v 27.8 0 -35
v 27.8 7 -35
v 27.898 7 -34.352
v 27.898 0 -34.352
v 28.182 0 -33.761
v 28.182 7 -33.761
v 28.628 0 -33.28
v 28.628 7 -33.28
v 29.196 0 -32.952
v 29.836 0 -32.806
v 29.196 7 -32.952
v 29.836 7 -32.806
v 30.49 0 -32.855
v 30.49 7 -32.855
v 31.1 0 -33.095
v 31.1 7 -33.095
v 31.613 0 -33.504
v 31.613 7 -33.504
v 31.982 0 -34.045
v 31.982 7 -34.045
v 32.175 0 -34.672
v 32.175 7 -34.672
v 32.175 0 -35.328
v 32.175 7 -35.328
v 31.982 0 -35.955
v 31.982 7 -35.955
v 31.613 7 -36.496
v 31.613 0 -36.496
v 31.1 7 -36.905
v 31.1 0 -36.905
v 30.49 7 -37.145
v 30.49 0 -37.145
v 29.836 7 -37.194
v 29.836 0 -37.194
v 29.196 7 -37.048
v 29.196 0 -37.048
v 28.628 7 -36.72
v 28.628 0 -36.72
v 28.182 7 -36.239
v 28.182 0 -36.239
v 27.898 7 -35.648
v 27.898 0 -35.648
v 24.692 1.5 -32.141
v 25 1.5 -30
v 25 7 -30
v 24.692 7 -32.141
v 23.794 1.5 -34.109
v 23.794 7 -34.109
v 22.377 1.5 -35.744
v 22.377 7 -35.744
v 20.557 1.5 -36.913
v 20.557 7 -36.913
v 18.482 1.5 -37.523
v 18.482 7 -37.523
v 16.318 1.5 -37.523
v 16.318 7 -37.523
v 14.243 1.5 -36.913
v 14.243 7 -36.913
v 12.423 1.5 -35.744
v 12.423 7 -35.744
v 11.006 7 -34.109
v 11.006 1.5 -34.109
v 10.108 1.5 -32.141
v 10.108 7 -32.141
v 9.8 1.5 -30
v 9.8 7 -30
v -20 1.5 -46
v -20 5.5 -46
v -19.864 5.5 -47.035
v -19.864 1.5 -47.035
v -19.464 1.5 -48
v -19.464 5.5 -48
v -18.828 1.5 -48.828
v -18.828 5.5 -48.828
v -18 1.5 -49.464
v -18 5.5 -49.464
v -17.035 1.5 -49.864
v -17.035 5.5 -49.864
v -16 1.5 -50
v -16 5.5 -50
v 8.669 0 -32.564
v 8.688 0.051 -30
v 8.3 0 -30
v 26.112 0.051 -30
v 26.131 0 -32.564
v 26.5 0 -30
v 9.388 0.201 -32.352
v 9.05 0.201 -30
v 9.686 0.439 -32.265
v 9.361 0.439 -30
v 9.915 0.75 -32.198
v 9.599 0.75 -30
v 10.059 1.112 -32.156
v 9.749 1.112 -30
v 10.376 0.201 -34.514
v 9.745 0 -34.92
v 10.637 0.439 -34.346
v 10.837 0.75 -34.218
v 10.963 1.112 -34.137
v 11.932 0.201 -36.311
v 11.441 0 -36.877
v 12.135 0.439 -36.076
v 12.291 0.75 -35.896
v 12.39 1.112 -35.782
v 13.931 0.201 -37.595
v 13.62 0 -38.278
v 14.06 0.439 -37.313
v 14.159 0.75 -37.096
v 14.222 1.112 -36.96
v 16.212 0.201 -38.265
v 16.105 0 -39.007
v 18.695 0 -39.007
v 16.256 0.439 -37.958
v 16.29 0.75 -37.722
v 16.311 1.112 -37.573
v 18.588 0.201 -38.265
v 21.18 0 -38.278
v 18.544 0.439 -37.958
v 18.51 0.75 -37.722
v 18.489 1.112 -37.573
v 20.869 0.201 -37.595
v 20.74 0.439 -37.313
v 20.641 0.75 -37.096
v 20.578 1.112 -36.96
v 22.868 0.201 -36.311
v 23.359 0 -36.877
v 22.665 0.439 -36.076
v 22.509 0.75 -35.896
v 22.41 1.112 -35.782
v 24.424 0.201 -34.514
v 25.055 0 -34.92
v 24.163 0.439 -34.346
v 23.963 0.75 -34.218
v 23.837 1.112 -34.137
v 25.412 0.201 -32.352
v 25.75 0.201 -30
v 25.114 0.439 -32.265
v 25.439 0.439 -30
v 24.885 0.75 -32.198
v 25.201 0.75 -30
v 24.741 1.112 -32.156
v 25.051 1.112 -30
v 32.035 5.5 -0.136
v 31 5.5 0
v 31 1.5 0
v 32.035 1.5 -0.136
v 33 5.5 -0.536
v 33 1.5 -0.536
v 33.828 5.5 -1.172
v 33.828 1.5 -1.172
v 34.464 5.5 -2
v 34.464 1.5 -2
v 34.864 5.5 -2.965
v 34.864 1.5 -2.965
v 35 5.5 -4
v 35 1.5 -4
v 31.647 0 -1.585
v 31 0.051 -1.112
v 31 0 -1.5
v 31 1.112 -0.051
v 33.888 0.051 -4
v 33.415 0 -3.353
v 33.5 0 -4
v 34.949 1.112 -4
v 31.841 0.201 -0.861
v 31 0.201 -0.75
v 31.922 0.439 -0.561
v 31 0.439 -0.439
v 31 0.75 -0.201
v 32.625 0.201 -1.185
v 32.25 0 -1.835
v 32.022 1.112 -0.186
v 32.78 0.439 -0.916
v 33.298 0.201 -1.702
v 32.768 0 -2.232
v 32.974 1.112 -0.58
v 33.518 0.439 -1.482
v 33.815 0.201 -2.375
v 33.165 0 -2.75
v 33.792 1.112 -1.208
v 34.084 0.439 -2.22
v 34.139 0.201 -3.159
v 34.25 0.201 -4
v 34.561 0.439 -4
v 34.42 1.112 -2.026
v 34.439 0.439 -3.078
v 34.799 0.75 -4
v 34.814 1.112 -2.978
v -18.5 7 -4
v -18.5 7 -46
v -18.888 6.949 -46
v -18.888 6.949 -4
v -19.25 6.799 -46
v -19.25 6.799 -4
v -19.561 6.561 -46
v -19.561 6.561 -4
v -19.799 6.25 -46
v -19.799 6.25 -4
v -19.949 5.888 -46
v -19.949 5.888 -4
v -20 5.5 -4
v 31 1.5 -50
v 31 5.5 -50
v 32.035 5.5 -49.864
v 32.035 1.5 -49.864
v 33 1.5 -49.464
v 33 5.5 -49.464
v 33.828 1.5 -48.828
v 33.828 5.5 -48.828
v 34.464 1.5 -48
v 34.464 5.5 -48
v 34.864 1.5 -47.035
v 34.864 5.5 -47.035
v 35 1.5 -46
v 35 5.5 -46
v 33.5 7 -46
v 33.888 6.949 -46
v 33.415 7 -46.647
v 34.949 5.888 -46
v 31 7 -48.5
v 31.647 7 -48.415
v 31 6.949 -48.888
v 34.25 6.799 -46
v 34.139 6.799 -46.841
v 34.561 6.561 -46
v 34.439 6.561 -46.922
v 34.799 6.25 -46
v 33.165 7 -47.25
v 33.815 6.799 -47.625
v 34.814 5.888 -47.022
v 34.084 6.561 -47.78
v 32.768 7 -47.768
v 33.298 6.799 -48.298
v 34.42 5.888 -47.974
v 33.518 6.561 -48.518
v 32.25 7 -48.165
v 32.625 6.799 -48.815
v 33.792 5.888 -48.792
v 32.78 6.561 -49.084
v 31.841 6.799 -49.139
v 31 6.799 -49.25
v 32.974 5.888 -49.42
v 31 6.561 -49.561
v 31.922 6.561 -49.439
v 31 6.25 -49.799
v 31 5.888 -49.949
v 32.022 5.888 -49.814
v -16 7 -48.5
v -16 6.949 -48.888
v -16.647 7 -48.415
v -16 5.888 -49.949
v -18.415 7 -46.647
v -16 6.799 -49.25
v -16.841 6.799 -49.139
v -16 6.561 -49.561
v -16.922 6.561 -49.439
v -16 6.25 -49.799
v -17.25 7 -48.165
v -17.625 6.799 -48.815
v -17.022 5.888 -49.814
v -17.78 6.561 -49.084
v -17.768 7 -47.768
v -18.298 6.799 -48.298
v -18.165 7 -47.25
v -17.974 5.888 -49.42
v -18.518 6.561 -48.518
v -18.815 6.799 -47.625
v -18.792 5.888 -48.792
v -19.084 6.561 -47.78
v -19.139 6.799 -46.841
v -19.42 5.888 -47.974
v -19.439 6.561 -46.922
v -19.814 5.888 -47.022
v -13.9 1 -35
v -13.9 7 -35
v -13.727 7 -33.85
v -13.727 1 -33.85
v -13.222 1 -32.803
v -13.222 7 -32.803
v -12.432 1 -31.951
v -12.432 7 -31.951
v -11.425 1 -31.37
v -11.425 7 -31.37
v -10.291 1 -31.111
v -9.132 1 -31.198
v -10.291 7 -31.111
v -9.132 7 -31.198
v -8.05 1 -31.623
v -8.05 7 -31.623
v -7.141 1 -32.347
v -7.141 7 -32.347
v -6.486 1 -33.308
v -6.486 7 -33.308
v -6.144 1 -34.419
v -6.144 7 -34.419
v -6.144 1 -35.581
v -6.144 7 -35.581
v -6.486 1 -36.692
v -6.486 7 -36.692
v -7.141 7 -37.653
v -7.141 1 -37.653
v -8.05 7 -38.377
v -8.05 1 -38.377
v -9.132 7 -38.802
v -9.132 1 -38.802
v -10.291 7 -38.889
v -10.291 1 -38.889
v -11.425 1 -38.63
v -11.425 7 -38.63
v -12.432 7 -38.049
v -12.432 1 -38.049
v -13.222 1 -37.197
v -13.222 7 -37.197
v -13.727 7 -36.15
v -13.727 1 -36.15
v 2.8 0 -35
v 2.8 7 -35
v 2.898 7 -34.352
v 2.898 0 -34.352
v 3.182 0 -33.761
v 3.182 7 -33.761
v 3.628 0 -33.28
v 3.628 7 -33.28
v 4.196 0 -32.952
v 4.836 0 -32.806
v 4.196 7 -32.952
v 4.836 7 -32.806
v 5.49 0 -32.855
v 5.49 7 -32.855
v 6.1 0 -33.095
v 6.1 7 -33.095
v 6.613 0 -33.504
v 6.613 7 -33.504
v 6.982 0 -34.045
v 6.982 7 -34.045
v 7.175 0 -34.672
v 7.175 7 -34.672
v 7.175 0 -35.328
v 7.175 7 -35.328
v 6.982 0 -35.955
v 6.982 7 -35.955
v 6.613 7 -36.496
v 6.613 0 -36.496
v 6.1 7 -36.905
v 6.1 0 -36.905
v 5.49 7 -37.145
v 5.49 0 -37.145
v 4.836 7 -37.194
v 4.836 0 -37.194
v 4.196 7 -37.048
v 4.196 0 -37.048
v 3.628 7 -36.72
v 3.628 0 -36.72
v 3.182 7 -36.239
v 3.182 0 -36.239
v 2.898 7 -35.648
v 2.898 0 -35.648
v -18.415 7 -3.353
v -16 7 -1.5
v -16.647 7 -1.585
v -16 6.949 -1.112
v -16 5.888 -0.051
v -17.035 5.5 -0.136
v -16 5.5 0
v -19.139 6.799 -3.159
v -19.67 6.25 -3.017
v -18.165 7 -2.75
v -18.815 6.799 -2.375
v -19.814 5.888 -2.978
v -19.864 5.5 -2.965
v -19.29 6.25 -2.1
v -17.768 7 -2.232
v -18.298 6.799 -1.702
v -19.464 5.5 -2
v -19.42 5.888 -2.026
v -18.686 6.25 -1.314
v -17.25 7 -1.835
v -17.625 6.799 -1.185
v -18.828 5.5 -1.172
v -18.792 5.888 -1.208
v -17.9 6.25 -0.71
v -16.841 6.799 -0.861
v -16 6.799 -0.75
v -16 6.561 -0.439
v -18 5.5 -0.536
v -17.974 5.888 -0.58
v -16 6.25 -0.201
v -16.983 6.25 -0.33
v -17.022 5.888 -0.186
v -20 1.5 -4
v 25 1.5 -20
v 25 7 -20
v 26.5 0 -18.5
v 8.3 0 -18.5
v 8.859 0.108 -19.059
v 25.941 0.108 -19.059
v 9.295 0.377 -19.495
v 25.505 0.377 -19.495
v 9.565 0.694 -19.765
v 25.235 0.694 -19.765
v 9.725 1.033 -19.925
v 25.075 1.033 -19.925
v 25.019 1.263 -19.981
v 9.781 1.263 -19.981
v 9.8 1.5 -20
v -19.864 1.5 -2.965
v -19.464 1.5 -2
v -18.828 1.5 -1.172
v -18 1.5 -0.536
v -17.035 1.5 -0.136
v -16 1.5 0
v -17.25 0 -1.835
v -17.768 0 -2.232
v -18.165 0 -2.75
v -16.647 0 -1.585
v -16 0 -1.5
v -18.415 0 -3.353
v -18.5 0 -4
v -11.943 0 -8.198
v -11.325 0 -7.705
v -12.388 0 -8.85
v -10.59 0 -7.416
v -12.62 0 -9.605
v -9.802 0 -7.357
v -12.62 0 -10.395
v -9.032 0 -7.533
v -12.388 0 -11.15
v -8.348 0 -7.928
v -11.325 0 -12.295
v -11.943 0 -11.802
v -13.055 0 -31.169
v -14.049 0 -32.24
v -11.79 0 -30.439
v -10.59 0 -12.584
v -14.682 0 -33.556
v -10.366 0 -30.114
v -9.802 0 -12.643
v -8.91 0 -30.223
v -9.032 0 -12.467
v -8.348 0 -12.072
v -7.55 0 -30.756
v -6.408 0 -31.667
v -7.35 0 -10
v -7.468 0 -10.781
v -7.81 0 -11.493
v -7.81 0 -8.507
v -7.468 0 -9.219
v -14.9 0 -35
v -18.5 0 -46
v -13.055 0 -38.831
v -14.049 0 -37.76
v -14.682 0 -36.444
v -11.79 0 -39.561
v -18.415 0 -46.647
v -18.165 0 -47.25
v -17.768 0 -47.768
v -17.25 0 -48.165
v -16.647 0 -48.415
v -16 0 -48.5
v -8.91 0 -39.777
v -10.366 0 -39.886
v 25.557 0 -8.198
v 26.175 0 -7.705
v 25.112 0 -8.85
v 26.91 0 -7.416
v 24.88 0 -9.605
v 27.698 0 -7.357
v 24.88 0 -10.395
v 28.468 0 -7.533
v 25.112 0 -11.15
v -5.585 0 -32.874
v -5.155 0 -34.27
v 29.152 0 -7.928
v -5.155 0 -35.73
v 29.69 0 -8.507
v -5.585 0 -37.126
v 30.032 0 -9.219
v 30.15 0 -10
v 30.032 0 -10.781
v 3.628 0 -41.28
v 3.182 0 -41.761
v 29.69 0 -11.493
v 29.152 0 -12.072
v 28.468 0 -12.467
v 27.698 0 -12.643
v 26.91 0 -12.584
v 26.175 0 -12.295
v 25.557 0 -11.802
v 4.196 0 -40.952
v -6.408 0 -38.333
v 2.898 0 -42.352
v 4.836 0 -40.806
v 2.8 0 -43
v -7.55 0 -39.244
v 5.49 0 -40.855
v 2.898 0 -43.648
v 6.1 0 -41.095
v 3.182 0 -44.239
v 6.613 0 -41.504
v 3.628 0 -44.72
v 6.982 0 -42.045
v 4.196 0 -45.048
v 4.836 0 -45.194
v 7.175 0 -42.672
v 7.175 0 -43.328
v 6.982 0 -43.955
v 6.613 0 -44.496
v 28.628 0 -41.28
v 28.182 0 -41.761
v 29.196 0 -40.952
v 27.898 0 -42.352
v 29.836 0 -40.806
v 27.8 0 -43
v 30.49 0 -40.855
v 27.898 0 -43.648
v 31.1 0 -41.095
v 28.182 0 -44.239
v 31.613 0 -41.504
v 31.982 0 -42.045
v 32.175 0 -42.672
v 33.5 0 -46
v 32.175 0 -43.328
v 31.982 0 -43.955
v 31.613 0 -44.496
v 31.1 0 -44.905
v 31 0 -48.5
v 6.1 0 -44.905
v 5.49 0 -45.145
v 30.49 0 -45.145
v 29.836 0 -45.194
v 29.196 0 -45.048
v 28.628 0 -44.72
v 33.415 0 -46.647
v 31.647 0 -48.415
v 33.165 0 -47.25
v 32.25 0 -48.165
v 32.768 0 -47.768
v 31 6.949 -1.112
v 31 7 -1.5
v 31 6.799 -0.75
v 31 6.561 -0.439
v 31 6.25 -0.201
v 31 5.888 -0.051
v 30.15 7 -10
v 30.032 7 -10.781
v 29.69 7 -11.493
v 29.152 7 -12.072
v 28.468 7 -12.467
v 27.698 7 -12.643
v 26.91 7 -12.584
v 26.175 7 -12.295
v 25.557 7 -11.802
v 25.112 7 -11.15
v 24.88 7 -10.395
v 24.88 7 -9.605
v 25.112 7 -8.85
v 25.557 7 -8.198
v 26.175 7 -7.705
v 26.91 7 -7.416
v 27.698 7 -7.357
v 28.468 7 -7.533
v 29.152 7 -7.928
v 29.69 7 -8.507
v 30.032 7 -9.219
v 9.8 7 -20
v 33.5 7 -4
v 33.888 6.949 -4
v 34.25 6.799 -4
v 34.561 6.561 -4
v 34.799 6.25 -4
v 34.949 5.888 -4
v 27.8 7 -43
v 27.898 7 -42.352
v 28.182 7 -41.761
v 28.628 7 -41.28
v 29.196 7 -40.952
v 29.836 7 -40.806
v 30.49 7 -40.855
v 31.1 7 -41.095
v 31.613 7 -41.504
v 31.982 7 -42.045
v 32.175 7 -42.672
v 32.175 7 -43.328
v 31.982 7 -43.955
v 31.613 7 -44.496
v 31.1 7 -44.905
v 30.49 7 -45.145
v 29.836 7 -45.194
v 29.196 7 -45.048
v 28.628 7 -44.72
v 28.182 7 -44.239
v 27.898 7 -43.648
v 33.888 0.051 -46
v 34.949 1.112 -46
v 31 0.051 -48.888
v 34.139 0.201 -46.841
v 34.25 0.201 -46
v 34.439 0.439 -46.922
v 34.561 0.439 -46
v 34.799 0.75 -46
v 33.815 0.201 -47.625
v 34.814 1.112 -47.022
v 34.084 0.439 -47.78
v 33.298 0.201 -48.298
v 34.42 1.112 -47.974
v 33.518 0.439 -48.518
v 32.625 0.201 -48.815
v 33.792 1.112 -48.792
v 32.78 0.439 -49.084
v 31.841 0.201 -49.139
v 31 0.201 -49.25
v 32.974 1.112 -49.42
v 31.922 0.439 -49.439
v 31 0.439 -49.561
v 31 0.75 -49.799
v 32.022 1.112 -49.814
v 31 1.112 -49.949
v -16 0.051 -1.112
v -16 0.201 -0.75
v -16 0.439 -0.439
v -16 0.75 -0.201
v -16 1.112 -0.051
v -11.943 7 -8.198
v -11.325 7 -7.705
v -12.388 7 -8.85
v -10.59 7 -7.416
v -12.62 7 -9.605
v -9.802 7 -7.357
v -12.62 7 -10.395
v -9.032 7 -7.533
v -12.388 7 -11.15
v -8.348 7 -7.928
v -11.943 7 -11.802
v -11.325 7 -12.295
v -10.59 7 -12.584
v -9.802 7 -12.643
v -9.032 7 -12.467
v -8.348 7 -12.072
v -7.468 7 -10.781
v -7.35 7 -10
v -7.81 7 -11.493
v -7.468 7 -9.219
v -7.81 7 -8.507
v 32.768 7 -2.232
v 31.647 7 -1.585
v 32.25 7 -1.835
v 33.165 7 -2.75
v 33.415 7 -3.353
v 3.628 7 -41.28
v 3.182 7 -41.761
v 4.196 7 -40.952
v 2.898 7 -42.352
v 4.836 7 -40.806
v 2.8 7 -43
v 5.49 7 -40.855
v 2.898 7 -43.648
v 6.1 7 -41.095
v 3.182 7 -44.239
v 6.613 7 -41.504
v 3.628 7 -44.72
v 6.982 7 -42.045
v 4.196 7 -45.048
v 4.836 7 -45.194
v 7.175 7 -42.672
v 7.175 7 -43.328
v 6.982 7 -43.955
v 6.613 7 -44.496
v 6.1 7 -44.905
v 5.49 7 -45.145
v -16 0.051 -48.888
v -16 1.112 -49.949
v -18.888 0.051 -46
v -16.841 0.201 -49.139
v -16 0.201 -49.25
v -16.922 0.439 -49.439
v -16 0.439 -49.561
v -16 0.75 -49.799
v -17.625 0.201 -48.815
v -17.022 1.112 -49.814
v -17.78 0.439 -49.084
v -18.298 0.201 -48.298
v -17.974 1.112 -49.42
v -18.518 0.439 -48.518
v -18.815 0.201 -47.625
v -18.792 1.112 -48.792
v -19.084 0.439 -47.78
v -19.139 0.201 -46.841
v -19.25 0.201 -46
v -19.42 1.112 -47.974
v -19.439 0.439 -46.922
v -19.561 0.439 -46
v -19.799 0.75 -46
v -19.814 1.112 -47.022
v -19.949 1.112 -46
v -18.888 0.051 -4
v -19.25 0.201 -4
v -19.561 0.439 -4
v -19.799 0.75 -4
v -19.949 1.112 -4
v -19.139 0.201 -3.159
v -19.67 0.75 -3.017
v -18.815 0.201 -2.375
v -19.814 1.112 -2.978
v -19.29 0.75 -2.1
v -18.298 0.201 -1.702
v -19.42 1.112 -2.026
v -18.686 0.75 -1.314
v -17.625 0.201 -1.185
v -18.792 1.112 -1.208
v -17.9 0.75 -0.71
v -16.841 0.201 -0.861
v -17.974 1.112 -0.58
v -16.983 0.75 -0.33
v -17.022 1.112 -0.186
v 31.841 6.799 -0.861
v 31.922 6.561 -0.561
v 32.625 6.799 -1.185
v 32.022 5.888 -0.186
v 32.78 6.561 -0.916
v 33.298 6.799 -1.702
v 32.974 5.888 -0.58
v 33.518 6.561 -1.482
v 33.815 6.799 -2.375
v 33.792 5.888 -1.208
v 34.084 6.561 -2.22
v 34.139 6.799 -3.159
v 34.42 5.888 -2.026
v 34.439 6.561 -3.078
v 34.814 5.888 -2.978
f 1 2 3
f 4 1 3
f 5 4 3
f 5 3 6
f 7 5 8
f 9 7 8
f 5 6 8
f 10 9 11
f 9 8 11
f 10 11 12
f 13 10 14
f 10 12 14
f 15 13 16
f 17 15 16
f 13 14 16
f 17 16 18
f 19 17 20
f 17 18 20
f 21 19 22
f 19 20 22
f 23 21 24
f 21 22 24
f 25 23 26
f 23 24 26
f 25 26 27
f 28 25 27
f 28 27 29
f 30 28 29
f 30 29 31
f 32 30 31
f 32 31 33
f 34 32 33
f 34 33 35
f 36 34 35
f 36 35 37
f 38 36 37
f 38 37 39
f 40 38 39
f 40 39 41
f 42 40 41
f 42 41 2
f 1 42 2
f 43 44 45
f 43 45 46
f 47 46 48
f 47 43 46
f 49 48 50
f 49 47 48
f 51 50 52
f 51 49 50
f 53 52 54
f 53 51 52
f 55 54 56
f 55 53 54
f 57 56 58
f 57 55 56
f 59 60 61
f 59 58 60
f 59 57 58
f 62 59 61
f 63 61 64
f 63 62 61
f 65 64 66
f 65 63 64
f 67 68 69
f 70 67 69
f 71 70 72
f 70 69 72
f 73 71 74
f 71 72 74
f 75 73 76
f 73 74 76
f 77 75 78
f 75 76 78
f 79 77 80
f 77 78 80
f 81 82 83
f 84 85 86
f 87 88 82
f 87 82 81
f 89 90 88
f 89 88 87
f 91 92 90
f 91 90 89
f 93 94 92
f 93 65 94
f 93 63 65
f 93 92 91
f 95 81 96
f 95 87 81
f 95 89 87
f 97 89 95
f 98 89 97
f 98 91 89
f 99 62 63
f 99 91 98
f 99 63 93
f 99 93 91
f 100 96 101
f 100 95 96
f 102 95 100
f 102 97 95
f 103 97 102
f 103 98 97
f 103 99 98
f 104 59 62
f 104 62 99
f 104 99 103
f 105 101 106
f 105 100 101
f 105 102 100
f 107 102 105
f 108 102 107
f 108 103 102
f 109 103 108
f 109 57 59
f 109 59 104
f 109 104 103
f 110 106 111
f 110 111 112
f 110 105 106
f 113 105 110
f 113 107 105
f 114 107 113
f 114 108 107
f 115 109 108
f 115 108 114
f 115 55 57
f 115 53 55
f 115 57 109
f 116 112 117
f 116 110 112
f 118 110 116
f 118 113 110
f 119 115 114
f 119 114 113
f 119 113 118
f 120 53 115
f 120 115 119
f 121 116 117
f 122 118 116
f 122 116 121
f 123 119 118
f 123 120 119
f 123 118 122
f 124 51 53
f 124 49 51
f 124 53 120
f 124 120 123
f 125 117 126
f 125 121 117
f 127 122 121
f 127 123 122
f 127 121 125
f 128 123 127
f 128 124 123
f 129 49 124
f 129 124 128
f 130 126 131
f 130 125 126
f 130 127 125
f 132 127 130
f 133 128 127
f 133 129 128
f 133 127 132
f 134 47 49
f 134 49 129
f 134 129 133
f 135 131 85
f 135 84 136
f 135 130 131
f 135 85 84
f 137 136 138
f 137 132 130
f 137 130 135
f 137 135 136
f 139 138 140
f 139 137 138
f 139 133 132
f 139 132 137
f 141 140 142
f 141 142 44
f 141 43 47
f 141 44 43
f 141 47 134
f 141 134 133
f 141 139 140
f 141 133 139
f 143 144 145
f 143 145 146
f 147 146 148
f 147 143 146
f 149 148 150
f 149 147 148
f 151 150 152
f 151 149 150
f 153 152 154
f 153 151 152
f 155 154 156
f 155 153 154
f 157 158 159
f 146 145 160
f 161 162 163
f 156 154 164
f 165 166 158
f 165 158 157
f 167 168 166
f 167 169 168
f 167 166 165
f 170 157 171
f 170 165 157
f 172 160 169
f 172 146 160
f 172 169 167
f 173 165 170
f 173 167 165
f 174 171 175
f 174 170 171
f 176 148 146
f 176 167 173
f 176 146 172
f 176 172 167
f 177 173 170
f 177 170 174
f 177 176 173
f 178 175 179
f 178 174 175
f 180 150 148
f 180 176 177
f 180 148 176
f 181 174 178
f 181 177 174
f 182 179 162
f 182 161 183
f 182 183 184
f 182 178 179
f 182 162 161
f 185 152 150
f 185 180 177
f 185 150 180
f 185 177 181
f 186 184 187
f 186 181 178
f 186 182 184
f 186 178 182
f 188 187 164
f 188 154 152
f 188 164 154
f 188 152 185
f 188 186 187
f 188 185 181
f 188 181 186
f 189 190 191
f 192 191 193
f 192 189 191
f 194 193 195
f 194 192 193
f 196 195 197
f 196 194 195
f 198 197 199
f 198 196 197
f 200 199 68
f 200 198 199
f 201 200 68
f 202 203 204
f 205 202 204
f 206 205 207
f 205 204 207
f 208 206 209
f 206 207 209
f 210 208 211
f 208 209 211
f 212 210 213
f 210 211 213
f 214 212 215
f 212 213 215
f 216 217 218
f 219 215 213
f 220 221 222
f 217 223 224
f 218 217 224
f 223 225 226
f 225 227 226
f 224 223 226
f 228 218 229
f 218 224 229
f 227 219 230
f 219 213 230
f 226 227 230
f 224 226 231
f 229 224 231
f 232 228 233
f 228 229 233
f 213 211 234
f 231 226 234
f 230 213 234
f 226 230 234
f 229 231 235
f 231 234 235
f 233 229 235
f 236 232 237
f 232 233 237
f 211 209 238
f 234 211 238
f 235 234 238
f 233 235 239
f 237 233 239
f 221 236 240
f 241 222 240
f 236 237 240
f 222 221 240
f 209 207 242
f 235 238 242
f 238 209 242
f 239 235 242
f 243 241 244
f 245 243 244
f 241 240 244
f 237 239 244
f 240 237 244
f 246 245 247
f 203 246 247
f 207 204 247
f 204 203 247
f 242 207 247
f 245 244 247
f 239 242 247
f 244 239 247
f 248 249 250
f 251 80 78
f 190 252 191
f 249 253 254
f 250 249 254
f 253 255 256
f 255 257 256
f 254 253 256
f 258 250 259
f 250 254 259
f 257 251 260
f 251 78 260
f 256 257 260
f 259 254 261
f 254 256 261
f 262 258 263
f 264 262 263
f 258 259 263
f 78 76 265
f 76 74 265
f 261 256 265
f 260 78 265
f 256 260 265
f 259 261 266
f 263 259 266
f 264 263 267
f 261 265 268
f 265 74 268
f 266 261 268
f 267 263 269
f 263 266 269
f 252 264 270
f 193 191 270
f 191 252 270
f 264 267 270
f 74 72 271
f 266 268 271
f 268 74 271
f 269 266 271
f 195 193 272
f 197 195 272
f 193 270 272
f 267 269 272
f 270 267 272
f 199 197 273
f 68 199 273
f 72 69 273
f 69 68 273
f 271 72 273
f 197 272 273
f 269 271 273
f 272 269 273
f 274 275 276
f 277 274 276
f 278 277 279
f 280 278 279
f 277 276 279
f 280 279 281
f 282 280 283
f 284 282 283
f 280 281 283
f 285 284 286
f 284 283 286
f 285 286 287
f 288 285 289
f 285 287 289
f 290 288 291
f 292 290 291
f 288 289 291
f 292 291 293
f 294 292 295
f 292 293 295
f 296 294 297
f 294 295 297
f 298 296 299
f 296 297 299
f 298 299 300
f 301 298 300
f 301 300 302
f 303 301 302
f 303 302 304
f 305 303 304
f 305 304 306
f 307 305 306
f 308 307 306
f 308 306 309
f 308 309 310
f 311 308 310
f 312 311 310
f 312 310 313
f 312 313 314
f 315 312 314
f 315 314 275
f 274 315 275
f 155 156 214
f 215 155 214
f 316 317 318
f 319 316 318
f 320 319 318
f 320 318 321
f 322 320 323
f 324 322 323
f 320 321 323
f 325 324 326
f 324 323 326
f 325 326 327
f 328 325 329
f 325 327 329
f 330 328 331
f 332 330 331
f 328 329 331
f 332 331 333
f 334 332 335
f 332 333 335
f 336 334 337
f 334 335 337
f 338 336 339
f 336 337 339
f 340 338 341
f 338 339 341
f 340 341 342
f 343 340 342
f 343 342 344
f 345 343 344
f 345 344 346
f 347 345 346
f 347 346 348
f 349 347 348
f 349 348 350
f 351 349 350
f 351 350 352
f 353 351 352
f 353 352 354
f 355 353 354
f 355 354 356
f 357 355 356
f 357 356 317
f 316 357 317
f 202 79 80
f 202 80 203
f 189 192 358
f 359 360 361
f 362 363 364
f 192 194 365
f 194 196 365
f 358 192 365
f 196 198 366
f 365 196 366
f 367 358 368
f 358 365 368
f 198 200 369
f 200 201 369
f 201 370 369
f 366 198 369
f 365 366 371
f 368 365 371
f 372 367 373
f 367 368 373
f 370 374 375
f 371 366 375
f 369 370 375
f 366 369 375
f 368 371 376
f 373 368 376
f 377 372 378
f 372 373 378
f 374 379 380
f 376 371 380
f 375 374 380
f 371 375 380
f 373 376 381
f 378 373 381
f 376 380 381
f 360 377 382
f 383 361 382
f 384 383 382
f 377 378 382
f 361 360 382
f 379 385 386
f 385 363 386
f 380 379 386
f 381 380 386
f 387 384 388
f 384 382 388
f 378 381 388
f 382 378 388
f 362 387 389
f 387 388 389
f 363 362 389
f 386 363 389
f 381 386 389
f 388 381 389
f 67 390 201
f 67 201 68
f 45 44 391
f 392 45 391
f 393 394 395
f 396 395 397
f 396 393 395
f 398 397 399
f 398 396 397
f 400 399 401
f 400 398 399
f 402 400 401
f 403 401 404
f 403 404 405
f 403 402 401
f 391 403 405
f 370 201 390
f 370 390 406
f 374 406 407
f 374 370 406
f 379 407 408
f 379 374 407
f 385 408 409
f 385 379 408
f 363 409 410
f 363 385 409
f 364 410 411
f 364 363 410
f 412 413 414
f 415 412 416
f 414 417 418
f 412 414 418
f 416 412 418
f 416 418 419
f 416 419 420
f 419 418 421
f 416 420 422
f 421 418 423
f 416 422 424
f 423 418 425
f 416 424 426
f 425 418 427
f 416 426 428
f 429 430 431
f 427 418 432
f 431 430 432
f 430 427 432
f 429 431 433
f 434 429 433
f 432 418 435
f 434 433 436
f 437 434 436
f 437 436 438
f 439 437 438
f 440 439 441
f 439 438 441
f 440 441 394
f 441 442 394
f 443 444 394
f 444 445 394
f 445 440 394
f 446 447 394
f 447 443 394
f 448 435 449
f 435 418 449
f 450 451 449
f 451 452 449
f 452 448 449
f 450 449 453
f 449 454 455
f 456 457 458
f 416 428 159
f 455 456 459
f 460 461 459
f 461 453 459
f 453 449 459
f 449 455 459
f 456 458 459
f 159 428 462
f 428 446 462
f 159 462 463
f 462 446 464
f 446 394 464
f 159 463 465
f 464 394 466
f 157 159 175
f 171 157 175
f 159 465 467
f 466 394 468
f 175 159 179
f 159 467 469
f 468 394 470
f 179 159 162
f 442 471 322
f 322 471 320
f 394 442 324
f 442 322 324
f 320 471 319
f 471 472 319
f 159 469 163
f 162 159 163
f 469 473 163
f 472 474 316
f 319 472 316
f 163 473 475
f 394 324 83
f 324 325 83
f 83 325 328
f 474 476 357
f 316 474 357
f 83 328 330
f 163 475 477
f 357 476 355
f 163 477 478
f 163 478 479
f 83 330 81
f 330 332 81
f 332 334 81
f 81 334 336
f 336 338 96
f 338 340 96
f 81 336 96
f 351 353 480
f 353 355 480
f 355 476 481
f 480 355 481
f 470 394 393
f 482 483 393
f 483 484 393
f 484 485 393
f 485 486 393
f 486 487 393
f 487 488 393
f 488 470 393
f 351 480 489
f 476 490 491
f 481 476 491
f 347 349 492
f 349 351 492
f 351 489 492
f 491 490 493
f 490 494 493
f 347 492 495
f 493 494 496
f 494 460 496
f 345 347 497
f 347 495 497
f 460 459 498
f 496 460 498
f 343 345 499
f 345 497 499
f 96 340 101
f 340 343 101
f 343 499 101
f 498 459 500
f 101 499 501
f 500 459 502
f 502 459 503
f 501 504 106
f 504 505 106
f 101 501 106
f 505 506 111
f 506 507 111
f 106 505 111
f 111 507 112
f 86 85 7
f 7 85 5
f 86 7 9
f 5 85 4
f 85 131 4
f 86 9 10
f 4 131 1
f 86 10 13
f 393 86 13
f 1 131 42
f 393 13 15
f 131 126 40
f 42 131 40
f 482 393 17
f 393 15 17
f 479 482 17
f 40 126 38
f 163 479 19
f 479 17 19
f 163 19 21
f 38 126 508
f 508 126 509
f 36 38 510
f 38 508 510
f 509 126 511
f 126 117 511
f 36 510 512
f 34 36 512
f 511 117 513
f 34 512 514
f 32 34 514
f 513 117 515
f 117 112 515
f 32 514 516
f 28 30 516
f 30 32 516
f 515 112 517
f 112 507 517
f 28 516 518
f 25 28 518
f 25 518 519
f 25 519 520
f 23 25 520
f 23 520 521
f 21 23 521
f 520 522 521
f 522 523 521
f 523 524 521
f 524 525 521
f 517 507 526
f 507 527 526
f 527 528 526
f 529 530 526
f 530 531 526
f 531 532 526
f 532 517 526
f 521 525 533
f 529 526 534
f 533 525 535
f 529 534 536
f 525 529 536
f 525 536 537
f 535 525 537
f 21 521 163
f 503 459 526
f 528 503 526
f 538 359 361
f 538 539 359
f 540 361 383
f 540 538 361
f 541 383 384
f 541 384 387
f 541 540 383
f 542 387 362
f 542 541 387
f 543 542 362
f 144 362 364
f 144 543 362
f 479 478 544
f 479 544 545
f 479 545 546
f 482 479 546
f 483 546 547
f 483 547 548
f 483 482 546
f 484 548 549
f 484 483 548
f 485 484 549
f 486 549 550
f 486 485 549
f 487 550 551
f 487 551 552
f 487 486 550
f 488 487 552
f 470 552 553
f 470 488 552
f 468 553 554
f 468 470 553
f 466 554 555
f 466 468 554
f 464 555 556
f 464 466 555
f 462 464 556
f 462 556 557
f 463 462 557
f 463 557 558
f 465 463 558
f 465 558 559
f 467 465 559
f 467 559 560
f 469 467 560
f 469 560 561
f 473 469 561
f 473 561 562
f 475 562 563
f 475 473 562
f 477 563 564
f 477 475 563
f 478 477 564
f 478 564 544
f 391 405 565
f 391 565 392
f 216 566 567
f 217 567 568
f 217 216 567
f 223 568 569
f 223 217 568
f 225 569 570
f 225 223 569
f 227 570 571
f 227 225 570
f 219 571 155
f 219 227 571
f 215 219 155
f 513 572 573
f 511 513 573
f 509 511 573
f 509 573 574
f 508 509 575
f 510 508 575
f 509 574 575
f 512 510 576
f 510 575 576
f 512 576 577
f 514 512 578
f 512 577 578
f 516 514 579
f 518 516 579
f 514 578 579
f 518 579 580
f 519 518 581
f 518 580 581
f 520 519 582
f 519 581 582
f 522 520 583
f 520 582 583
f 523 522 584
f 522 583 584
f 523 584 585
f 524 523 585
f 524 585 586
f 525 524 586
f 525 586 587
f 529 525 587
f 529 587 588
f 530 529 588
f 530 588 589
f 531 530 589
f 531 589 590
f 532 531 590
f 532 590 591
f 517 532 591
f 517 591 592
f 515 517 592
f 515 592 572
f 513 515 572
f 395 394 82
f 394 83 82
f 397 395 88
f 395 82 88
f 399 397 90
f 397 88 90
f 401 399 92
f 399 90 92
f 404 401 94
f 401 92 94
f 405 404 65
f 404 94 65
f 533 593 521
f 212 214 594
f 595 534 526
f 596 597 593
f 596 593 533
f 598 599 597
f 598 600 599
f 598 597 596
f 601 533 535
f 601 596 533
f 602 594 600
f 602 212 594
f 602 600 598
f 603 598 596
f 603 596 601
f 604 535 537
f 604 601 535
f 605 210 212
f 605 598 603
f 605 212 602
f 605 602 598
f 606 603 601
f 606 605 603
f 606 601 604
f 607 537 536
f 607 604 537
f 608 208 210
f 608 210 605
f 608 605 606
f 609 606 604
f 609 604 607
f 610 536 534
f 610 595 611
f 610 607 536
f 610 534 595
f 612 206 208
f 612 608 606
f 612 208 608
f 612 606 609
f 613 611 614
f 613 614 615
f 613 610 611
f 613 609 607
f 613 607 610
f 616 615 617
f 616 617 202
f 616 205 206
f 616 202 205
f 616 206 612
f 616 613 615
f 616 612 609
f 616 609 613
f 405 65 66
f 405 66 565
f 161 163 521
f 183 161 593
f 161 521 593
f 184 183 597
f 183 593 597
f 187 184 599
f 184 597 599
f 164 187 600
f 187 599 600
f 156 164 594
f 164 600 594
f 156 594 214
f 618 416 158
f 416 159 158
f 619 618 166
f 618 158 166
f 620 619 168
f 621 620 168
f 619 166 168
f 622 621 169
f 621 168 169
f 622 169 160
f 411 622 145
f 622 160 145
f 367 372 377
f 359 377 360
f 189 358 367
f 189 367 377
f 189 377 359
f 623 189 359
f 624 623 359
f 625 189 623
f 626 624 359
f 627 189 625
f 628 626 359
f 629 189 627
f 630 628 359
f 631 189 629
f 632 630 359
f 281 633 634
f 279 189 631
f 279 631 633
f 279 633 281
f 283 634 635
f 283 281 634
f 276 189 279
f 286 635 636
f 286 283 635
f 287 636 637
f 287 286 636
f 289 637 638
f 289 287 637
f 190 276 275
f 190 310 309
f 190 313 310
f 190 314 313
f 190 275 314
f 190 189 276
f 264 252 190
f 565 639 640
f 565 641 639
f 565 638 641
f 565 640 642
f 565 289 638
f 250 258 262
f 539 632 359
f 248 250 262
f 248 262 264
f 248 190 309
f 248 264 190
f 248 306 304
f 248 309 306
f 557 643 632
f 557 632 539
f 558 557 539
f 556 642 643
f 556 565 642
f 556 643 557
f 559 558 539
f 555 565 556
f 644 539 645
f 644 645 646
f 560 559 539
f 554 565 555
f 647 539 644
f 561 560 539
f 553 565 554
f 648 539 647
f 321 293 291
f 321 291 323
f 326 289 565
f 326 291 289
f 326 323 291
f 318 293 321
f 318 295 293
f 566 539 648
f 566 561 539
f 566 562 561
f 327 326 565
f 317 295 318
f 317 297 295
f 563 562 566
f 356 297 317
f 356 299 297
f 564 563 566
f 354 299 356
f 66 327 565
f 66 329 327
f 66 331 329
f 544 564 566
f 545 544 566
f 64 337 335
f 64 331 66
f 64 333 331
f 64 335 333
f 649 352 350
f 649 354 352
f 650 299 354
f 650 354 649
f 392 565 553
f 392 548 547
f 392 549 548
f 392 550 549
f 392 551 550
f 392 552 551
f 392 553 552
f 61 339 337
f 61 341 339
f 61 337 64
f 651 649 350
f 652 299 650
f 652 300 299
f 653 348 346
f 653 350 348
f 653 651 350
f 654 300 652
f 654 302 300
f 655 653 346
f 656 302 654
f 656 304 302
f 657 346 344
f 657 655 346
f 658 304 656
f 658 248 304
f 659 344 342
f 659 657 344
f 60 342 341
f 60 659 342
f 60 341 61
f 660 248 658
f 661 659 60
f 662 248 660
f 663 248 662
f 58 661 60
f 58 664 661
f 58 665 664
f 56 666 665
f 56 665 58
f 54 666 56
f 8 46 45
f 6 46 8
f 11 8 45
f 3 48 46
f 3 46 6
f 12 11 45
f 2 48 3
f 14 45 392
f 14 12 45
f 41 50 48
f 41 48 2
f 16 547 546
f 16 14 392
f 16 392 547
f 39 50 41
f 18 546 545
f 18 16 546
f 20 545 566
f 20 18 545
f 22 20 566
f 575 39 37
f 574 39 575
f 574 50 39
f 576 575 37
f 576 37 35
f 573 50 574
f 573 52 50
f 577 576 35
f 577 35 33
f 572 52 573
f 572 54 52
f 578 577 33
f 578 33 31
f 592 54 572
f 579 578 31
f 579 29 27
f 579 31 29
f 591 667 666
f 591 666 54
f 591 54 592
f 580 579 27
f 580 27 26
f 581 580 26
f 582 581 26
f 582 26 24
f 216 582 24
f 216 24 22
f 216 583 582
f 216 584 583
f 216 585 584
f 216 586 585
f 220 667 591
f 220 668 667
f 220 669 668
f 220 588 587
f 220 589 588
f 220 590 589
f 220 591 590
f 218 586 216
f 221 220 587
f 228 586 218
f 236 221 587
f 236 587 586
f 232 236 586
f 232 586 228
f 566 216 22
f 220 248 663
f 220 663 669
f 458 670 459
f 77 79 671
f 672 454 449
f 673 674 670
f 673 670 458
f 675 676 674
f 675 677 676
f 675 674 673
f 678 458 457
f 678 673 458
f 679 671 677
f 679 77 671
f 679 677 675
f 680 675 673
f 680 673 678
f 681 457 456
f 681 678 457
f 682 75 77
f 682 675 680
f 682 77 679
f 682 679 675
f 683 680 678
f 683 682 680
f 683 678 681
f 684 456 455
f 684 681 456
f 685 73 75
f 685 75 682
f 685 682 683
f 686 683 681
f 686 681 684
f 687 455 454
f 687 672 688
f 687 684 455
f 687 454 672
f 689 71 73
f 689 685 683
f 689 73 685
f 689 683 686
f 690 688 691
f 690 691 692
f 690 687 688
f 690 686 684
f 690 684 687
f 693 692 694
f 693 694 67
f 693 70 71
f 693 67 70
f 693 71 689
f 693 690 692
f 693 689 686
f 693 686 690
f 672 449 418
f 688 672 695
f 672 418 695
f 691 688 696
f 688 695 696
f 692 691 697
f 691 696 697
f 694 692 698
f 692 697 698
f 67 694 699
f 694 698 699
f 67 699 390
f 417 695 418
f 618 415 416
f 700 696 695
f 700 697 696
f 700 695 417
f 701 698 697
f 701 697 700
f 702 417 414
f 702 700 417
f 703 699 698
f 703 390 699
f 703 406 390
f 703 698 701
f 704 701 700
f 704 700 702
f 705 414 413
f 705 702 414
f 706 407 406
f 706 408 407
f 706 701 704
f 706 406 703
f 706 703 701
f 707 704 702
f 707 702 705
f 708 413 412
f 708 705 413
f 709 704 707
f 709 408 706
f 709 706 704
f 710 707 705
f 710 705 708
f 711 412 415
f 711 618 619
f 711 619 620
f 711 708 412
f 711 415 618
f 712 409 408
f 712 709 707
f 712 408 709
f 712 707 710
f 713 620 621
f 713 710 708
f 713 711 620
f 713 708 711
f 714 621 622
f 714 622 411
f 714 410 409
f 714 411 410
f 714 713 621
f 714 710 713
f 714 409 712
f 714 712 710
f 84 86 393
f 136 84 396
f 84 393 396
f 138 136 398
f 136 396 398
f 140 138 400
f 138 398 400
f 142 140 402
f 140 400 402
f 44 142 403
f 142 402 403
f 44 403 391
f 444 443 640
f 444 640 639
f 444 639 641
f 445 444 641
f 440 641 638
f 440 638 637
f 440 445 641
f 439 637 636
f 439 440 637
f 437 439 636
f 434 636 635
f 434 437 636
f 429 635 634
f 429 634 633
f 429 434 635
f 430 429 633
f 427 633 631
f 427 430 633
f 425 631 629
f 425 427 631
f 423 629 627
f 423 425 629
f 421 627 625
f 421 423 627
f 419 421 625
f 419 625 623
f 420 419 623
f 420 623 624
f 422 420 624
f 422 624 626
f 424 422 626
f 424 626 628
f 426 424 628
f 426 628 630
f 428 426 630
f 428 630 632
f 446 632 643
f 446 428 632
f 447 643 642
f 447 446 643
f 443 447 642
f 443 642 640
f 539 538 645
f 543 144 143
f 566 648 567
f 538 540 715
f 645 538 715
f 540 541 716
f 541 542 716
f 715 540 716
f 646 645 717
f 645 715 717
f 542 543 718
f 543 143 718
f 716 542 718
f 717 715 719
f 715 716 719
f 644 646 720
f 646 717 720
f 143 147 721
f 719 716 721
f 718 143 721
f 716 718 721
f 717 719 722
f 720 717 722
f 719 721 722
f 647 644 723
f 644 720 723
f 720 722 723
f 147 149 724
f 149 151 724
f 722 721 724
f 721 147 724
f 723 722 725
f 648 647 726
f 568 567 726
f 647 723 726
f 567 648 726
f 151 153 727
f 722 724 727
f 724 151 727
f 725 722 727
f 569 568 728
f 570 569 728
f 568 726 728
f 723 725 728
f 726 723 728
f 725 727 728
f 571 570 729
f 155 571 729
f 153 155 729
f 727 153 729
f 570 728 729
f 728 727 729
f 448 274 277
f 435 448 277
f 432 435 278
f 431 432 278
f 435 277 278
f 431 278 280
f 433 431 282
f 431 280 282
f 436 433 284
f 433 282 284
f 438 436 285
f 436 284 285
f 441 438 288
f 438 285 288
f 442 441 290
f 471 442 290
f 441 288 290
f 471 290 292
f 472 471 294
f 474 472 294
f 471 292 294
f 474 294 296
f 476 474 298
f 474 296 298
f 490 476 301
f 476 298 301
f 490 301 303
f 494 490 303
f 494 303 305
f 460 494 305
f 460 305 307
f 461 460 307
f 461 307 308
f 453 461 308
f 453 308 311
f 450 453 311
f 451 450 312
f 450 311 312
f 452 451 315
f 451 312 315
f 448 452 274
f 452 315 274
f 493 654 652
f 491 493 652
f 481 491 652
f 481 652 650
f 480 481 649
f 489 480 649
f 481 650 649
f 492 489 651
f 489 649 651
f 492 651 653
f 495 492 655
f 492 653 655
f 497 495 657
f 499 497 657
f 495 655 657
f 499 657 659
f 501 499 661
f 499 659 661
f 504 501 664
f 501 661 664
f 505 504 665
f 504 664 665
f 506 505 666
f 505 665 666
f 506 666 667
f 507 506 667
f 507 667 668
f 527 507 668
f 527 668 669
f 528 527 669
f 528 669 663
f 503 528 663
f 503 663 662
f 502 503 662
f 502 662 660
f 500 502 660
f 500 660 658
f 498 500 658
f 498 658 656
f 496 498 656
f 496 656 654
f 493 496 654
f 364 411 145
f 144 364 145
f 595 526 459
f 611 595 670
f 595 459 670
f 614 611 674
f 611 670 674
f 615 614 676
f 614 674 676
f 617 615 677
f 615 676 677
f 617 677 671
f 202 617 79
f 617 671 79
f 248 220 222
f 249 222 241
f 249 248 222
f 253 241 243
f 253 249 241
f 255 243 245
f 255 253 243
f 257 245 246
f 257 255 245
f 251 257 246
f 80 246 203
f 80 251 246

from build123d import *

# Parameters (mm, degrees)
SKETCH1_W                    = 55
SKETCH1_H                    = 50
BOSS_EXTRUDE1_DEPTH          = 7
SKETCH6_W                    = 15.2
SKETCH6_H                    = 10
CUT_EXTRUDE1_DEPTH           = 10
M5_CLEARANCE_HOLE1_OUTLINE_R = 2.65
M5_CLEARANCE_HOLE1_DEPTH     = 7
F_4_4_4_4_DIAMETER_HOLE2_D   = 4.4
F_7_8_7_8_DIAMETER_HOLE1_D   = 7.8
FILLET1_R                    = 4
FILLET2_R                    = 1.5
CHAMFER1_SIZE                = 1


# Read off the part's stored shape, not the designer's step: M5 Clearance Hole1
with BuildPart() as part:
    # Sketch1 → Boss-Extrude1 (new body)
    with BuildSketch(Plane(origin=(0, 0, 0), x_dir=(1, 0, 0), z_dir=(0, 1, 0))):
        with Locations((7.5, 25)):
            Rectangle(SKETCH1_W, SKETCH1_H)
    extrude(amount=BOSS_EXTRUDE1_DEPTH)

    # Sketch6 → Cut-Extrude1 (cut)
    with BuildSketch(Plane.XZ):
        with Locations((17.4, -25)):
            Rectangle(SKETCH6_W, SKETCH6_H)
        with BuildLine():
            Line((9.8, -30), (25, -30))
            ThreePointArc((25, -30), (17.4, -37.6), (9.8, -30))
        make_face()
    extrude(amount=-CUT_EXTRUDE1_DEPTH, mode=Mode.SUBTRACT)

    # M5 Clearance Hole1 outline → M5 Clearance Hole1 (cut)
    with BuildSketch(Plane(origin=(0, 0, 0), x_dir=(1, 0, 0), z_dir=(0, 1, 0))):
        with Locations((-10, 10)):
            Circle(M5_CLEARANCE_HOLE1_OUTLINE_R)
        with Locations((27.5, 10)):
            Circle(M5_CLEARANCE_HOLE1_OUTLINE_R)
    extrude(amount=M5_CLEARANCE_HOLE1_DEPTH, mode=Mode.SUBTRACT)

    # Ø4.4 (4.4) Diameter Hole2 (through all)
    with Locations(Plane.XZ):
        with Locations((30, -43), (5, -35), (30, -35), (5, -43)):
            Hole(F_4_4_4_4_DIAMETER_HOLE2_D / 2)

    # Ø7.8 (7.8) Diameter Hole1 (through all)
    with Locations(Plane.XZ):
        with Locations((-10, -35)):
            Hole(F_7_8_7_8_DIAMETER_HOLE1_D / 2)

    # Fillet1
    fillet1_edges = [part.edges().sort_by_distance(p)[0] for p in [
        (35, 3.5, -50),
        (35, 3.5, 0),
        (-20, 3.5, 0),
        (-20, 3.5, -50),
    ]]
    fillet(fillet1_edges, radius=FILLET1_R)

    # Fillet2
    fillet2_edges = [part.edges().sort_by_distance(p)[0] for p in [
        (7.5, 0, 0),
        (7.5, 7, 0),
        (-20, 0, -25),
        (7.5, 0, -50),
        (35, 0, -25),
        (33.828427125, 0, -1.171572875),
        (33.828427125, 0, -48.828427125),
        (-18.828427125, 0, -48.828427125),
        (-18.828427125, 0, -1.171572875),
        (-20, 7, -25),
        (7.5, 7, -50),
        (35, 7, -25),
        (33.828427125, 7, -1.171572875),
        (33.828427125, 7, -48.828427125),
        (-18.828427125, 7, -48.828427125),
        (-18.828427125, 7, -1.171572875),
        (25, 0, -25),
        (17.4, 0, -20),
        (9.8, 0, -25),
        (17.4, 0, -37.6),
    ]]
    fillet(fillet2_edges, radius=FILLET2_R)

    # Chamfer1
    chamfer1_edges = [part.edges().sort_by_distance(p)[0] for p in [
        (-6.1, 0, -35),
    ]]
    chamfer(chamfer1_edges, length=CHAMFER1_SIZE)


solid = part.part
